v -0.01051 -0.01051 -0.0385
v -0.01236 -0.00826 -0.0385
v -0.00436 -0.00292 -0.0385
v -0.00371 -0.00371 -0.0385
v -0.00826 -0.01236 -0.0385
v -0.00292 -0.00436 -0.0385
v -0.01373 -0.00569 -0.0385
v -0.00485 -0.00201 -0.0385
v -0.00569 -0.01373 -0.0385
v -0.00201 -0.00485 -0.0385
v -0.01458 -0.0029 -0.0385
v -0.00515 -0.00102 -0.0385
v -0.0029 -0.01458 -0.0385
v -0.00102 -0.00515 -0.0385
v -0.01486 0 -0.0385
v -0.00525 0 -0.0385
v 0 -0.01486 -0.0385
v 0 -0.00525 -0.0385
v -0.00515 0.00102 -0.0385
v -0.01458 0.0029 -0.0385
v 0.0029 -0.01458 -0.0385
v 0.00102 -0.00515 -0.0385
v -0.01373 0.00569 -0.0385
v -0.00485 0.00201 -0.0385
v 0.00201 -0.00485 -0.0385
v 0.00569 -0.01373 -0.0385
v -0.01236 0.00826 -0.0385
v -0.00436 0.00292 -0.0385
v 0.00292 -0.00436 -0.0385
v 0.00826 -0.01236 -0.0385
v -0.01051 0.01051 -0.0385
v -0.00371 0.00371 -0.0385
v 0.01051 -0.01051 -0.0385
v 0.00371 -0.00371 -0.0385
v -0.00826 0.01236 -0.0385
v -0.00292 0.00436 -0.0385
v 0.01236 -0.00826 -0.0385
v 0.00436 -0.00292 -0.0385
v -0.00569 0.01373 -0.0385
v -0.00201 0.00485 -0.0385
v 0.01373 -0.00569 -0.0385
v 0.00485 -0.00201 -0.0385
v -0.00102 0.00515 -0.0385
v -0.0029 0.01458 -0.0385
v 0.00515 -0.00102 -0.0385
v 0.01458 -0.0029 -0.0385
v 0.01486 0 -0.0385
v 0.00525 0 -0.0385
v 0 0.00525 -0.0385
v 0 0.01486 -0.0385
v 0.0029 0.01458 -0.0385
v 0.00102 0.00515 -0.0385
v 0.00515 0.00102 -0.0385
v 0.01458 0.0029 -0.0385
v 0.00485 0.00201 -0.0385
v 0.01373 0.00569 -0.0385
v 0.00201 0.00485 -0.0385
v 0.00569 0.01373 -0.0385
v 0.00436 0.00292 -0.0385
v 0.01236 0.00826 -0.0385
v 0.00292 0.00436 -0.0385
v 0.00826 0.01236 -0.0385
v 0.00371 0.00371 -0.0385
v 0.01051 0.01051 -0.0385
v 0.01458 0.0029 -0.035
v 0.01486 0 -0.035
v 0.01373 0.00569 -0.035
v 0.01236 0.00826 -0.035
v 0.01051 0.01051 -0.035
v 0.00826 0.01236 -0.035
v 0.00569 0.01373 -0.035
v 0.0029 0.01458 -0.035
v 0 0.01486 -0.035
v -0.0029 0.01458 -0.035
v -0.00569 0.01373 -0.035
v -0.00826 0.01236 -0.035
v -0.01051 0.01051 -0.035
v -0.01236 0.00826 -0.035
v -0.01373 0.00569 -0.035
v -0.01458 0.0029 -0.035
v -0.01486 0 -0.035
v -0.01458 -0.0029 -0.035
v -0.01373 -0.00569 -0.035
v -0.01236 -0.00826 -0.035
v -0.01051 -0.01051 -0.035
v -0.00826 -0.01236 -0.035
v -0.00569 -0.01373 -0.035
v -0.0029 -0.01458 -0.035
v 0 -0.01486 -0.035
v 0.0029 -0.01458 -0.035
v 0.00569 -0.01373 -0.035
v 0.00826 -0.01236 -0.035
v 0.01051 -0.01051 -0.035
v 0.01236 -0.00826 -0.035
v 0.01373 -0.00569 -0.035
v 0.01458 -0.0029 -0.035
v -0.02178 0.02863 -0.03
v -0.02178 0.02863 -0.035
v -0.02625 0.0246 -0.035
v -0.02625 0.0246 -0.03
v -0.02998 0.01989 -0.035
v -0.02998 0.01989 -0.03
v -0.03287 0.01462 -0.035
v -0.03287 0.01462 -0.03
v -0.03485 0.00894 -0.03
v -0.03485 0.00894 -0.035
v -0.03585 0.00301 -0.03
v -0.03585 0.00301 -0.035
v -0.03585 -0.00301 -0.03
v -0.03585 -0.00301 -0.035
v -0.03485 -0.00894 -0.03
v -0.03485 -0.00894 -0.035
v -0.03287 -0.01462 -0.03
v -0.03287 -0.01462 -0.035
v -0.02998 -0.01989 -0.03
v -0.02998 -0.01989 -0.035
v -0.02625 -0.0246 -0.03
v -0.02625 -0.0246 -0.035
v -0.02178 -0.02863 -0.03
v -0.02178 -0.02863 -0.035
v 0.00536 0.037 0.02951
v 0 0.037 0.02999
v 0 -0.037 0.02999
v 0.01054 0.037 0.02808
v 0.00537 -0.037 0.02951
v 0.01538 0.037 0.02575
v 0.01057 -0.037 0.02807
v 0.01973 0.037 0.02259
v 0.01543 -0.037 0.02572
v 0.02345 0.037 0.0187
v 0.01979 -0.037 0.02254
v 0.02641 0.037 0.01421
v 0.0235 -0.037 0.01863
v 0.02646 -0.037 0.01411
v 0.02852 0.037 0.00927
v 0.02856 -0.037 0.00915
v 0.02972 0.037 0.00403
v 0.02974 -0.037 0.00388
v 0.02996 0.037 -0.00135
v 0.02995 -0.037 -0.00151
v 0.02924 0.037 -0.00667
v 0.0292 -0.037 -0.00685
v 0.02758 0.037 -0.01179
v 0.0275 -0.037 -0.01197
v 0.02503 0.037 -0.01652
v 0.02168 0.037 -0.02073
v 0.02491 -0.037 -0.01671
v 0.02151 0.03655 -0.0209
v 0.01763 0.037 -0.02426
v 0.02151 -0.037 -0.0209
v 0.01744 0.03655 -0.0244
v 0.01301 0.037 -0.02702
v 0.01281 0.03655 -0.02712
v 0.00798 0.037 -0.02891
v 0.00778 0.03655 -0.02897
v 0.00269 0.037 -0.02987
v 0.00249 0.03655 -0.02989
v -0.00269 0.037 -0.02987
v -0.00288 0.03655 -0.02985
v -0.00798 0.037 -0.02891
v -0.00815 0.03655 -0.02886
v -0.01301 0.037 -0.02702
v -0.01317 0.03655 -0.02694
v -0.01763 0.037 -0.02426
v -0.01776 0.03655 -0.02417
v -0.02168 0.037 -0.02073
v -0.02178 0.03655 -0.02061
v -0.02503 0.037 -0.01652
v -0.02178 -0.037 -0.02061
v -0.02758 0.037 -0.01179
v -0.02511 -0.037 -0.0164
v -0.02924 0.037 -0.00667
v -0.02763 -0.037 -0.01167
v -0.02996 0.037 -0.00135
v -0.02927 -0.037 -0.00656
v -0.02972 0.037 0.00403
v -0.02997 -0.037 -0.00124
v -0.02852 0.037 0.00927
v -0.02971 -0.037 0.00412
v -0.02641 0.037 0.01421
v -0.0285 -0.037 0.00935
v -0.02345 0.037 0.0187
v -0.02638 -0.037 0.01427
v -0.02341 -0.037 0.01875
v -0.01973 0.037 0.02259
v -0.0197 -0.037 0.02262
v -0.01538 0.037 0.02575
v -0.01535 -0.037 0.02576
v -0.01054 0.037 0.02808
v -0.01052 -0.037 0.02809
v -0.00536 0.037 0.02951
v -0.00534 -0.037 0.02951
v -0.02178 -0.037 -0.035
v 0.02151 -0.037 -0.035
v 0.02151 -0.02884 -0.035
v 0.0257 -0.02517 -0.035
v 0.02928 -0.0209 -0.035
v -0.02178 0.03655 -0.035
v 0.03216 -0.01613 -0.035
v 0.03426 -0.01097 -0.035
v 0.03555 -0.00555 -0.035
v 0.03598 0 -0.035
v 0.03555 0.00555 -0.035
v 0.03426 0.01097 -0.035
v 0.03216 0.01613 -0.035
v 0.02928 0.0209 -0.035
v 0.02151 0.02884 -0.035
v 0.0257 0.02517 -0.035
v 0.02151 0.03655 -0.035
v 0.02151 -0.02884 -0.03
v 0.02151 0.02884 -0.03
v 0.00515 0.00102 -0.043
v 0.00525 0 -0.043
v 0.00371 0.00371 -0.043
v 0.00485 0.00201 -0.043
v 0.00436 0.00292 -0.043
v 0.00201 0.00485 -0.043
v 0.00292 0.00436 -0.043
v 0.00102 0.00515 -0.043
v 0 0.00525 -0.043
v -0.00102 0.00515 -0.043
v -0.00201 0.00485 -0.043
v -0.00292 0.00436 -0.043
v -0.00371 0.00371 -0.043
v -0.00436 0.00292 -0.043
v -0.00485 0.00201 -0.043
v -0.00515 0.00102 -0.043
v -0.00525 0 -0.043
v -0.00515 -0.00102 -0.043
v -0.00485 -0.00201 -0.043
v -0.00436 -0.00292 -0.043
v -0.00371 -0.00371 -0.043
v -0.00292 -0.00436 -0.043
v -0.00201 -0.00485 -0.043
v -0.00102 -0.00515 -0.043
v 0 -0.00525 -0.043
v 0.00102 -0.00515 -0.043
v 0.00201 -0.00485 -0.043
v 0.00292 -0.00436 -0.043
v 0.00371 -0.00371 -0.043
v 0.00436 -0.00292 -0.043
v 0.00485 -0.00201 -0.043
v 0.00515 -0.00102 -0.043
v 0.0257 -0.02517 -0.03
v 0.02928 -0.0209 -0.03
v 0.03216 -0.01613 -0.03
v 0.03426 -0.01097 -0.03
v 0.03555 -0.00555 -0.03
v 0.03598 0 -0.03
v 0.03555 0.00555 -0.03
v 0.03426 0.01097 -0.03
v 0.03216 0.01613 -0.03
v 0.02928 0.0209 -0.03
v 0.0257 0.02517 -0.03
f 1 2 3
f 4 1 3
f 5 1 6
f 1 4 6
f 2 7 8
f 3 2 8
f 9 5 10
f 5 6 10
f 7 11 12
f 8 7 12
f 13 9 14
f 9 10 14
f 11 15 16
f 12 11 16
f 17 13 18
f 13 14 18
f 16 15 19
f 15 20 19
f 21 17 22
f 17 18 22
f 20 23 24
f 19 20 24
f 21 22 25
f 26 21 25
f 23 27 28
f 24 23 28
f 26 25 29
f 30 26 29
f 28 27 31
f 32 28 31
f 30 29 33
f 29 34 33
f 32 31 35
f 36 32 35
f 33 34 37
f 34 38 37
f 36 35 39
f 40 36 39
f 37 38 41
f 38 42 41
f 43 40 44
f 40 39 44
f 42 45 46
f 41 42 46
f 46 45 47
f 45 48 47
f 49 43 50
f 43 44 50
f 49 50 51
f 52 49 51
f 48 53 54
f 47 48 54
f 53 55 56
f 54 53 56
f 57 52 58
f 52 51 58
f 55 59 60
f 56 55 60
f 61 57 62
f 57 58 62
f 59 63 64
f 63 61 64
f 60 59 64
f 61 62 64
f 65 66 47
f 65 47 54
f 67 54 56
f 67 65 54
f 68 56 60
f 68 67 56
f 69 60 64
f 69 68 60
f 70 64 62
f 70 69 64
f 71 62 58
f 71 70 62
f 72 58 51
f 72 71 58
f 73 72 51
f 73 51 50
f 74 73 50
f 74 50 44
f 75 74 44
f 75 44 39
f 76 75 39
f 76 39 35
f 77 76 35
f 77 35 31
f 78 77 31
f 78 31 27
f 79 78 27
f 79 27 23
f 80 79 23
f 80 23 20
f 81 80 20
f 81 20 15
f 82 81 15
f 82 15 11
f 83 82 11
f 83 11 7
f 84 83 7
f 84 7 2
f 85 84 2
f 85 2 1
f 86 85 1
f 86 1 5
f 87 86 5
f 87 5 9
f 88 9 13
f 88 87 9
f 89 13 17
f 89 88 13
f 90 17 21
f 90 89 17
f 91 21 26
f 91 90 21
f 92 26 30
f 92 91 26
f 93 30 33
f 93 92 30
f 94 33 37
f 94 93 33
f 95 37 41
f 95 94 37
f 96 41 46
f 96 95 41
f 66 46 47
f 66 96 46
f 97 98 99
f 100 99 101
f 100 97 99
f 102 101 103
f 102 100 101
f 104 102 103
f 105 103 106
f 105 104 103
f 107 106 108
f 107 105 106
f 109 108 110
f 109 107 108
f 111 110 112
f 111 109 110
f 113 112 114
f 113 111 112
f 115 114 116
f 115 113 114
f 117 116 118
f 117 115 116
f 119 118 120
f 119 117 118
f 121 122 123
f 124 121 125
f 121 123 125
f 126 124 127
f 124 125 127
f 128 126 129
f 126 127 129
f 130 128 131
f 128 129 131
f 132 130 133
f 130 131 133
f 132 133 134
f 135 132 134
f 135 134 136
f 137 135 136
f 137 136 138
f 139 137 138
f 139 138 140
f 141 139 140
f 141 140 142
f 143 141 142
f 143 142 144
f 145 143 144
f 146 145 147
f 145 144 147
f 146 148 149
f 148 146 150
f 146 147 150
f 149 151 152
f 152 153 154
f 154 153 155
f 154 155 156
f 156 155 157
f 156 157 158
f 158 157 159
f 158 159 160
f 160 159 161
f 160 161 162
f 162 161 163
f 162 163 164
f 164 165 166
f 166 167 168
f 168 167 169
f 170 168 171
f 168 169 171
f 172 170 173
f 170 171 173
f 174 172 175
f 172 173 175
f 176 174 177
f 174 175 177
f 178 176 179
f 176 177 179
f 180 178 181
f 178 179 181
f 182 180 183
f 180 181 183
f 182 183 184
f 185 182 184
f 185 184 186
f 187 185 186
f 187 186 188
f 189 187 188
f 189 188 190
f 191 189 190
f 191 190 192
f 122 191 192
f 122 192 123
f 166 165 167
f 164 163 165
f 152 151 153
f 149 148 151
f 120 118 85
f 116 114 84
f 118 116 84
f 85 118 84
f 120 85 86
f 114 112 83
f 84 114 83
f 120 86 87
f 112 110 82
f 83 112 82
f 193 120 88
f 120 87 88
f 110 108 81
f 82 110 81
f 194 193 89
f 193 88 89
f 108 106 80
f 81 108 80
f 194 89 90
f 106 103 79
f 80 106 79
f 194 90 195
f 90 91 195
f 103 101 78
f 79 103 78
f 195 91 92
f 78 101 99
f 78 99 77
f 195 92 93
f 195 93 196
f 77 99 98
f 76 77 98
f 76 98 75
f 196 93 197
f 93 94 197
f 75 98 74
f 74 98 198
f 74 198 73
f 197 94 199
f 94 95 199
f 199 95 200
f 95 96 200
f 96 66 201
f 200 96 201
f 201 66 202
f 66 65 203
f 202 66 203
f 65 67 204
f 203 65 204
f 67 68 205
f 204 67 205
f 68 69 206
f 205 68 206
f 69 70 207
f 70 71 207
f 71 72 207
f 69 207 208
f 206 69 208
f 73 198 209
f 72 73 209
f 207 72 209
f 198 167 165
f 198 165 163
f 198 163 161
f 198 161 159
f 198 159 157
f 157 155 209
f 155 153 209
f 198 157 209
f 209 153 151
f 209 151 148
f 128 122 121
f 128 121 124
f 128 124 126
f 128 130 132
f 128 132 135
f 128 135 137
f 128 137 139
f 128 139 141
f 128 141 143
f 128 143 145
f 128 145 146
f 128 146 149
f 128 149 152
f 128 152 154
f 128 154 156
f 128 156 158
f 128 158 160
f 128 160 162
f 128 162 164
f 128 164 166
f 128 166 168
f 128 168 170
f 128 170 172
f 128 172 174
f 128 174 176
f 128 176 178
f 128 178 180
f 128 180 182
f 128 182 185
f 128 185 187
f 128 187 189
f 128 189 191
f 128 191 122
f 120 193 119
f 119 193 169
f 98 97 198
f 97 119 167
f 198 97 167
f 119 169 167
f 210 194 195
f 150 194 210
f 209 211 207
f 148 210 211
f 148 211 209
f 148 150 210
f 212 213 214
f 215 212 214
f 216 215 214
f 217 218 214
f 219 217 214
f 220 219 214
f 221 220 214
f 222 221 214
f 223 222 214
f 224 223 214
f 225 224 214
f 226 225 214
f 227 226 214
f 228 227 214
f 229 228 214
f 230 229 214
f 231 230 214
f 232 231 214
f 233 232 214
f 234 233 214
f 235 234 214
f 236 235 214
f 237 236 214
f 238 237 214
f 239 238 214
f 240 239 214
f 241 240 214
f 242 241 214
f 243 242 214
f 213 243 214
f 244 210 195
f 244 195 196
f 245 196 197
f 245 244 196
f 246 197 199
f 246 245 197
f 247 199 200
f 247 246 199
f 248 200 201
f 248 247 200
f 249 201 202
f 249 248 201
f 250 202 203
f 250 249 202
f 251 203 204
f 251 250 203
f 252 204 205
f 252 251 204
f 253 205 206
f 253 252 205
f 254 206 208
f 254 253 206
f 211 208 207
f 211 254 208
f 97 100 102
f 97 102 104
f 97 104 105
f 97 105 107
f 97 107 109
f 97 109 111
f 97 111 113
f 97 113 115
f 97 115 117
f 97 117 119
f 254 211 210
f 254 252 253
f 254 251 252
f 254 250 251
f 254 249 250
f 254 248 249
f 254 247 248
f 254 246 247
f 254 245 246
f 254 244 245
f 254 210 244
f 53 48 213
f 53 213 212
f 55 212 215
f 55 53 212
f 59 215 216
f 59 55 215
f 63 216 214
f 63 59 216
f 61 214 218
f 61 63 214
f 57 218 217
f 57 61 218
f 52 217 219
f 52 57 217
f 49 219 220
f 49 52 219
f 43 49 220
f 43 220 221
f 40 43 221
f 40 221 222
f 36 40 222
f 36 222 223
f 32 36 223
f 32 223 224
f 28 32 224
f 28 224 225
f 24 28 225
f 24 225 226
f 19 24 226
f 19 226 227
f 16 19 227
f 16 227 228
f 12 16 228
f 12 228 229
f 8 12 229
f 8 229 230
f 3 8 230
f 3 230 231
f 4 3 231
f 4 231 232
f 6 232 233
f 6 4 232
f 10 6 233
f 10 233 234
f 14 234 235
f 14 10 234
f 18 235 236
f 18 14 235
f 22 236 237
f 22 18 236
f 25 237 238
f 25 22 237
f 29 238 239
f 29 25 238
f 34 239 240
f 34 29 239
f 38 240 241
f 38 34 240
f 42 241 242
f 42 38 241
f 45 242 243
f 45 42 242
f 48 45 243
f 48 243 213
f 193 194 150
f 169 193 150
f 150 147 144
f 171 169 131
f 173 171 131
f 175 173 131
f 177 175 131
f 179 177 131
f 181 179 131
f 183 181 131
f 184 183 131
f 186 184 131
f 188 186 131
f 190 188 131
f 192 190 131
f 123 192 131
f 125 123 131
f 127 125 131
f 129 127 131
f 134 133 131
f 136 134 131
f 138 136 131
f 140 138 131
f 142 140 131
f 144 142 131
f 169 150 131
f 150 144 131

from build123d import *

# Parameters (mm, degrees)
BOSS_EXTRUDE1_DEPTH      = 0.037
BOSS_EXTRUDE1_DEPTH_BACK = 0.037
SKETCH1_R                = 0.02999071
SKETCH2_W                = 0.043295271
SKETCH2_H                = 0.073549039
BOSS_EXTRUDE2_DEPTH      = 0.035
BOSS_EXTRUDE3_START      = -0.03
SKETCH2_3_R              = 0.035976834
BOSS_EXTRUDE3_DEPTH      = 0.005
SKETCH3_R                = 0.014860666
SKETCH3_R_2              = 0.005248218
BOSS_EXTRUDE4_DEPTH      = 0.0385
SKETCH3_2_R              = 0.005248218
BOSS_EXTRUDE5_DEPTH      = 0.043


with BuildPart() as part:
    # Sketch1 → Boss-Extrude1 (new, two sides: drawn at the far end of the back side and taken through both)
    with BuildSketch(Plane(origin=(0, 0, 0), x_dir=(1, 0, 0), z_dir=(0, 1, 0)).offset(-BOSS_EXTRUDE1_DEPTH_BACK)):
        Circle(SKETCH1_R)
    extrude(amount=BOSS_EXTRUDE1_DEPTH + BOSS_EXTRUDE1_DEPTH_BACK)

    # Sketch2 → Boss-Extrude2 (add)
    with BuildSketch(Plane.XY):
        with Locations((-0.000136275, -0.00022548)):
            Rectangle(SKETCH2_W, SKETCH2_H)
    extrude(amount=-BOSS_EXTRUDE2_DEPTH)

    # Sketch2<3> → Boss-Extrude3 (add)
    with BuildSketch(Plane.XY.offset(BOSS_EXTRUDE3_START)):
        Circle(SKETCH2_3_R)
    extrude(amount=-BOSS_EXTRUDE3_DEPTH)

    # Sketch3 → Boss-Extrude4 (add)
    with BuildSketch(Plane.XY):
        Circle(SKETCH3_R)
        Circle(SKETCH3_R_2, mode=Mode.SUBTRACT)
    extrude(amount=-BOSS_EXTRUDE4_DEPTH)

    # Sketch3<2> → Boss-Extrude5 (add)
    with BuildSketch(Plane.XY):
        Circle(SKETCH3_2_R)
    extrude(amount=-BOSS_EXTRUDE5_DEPTH)


solid = part.part
